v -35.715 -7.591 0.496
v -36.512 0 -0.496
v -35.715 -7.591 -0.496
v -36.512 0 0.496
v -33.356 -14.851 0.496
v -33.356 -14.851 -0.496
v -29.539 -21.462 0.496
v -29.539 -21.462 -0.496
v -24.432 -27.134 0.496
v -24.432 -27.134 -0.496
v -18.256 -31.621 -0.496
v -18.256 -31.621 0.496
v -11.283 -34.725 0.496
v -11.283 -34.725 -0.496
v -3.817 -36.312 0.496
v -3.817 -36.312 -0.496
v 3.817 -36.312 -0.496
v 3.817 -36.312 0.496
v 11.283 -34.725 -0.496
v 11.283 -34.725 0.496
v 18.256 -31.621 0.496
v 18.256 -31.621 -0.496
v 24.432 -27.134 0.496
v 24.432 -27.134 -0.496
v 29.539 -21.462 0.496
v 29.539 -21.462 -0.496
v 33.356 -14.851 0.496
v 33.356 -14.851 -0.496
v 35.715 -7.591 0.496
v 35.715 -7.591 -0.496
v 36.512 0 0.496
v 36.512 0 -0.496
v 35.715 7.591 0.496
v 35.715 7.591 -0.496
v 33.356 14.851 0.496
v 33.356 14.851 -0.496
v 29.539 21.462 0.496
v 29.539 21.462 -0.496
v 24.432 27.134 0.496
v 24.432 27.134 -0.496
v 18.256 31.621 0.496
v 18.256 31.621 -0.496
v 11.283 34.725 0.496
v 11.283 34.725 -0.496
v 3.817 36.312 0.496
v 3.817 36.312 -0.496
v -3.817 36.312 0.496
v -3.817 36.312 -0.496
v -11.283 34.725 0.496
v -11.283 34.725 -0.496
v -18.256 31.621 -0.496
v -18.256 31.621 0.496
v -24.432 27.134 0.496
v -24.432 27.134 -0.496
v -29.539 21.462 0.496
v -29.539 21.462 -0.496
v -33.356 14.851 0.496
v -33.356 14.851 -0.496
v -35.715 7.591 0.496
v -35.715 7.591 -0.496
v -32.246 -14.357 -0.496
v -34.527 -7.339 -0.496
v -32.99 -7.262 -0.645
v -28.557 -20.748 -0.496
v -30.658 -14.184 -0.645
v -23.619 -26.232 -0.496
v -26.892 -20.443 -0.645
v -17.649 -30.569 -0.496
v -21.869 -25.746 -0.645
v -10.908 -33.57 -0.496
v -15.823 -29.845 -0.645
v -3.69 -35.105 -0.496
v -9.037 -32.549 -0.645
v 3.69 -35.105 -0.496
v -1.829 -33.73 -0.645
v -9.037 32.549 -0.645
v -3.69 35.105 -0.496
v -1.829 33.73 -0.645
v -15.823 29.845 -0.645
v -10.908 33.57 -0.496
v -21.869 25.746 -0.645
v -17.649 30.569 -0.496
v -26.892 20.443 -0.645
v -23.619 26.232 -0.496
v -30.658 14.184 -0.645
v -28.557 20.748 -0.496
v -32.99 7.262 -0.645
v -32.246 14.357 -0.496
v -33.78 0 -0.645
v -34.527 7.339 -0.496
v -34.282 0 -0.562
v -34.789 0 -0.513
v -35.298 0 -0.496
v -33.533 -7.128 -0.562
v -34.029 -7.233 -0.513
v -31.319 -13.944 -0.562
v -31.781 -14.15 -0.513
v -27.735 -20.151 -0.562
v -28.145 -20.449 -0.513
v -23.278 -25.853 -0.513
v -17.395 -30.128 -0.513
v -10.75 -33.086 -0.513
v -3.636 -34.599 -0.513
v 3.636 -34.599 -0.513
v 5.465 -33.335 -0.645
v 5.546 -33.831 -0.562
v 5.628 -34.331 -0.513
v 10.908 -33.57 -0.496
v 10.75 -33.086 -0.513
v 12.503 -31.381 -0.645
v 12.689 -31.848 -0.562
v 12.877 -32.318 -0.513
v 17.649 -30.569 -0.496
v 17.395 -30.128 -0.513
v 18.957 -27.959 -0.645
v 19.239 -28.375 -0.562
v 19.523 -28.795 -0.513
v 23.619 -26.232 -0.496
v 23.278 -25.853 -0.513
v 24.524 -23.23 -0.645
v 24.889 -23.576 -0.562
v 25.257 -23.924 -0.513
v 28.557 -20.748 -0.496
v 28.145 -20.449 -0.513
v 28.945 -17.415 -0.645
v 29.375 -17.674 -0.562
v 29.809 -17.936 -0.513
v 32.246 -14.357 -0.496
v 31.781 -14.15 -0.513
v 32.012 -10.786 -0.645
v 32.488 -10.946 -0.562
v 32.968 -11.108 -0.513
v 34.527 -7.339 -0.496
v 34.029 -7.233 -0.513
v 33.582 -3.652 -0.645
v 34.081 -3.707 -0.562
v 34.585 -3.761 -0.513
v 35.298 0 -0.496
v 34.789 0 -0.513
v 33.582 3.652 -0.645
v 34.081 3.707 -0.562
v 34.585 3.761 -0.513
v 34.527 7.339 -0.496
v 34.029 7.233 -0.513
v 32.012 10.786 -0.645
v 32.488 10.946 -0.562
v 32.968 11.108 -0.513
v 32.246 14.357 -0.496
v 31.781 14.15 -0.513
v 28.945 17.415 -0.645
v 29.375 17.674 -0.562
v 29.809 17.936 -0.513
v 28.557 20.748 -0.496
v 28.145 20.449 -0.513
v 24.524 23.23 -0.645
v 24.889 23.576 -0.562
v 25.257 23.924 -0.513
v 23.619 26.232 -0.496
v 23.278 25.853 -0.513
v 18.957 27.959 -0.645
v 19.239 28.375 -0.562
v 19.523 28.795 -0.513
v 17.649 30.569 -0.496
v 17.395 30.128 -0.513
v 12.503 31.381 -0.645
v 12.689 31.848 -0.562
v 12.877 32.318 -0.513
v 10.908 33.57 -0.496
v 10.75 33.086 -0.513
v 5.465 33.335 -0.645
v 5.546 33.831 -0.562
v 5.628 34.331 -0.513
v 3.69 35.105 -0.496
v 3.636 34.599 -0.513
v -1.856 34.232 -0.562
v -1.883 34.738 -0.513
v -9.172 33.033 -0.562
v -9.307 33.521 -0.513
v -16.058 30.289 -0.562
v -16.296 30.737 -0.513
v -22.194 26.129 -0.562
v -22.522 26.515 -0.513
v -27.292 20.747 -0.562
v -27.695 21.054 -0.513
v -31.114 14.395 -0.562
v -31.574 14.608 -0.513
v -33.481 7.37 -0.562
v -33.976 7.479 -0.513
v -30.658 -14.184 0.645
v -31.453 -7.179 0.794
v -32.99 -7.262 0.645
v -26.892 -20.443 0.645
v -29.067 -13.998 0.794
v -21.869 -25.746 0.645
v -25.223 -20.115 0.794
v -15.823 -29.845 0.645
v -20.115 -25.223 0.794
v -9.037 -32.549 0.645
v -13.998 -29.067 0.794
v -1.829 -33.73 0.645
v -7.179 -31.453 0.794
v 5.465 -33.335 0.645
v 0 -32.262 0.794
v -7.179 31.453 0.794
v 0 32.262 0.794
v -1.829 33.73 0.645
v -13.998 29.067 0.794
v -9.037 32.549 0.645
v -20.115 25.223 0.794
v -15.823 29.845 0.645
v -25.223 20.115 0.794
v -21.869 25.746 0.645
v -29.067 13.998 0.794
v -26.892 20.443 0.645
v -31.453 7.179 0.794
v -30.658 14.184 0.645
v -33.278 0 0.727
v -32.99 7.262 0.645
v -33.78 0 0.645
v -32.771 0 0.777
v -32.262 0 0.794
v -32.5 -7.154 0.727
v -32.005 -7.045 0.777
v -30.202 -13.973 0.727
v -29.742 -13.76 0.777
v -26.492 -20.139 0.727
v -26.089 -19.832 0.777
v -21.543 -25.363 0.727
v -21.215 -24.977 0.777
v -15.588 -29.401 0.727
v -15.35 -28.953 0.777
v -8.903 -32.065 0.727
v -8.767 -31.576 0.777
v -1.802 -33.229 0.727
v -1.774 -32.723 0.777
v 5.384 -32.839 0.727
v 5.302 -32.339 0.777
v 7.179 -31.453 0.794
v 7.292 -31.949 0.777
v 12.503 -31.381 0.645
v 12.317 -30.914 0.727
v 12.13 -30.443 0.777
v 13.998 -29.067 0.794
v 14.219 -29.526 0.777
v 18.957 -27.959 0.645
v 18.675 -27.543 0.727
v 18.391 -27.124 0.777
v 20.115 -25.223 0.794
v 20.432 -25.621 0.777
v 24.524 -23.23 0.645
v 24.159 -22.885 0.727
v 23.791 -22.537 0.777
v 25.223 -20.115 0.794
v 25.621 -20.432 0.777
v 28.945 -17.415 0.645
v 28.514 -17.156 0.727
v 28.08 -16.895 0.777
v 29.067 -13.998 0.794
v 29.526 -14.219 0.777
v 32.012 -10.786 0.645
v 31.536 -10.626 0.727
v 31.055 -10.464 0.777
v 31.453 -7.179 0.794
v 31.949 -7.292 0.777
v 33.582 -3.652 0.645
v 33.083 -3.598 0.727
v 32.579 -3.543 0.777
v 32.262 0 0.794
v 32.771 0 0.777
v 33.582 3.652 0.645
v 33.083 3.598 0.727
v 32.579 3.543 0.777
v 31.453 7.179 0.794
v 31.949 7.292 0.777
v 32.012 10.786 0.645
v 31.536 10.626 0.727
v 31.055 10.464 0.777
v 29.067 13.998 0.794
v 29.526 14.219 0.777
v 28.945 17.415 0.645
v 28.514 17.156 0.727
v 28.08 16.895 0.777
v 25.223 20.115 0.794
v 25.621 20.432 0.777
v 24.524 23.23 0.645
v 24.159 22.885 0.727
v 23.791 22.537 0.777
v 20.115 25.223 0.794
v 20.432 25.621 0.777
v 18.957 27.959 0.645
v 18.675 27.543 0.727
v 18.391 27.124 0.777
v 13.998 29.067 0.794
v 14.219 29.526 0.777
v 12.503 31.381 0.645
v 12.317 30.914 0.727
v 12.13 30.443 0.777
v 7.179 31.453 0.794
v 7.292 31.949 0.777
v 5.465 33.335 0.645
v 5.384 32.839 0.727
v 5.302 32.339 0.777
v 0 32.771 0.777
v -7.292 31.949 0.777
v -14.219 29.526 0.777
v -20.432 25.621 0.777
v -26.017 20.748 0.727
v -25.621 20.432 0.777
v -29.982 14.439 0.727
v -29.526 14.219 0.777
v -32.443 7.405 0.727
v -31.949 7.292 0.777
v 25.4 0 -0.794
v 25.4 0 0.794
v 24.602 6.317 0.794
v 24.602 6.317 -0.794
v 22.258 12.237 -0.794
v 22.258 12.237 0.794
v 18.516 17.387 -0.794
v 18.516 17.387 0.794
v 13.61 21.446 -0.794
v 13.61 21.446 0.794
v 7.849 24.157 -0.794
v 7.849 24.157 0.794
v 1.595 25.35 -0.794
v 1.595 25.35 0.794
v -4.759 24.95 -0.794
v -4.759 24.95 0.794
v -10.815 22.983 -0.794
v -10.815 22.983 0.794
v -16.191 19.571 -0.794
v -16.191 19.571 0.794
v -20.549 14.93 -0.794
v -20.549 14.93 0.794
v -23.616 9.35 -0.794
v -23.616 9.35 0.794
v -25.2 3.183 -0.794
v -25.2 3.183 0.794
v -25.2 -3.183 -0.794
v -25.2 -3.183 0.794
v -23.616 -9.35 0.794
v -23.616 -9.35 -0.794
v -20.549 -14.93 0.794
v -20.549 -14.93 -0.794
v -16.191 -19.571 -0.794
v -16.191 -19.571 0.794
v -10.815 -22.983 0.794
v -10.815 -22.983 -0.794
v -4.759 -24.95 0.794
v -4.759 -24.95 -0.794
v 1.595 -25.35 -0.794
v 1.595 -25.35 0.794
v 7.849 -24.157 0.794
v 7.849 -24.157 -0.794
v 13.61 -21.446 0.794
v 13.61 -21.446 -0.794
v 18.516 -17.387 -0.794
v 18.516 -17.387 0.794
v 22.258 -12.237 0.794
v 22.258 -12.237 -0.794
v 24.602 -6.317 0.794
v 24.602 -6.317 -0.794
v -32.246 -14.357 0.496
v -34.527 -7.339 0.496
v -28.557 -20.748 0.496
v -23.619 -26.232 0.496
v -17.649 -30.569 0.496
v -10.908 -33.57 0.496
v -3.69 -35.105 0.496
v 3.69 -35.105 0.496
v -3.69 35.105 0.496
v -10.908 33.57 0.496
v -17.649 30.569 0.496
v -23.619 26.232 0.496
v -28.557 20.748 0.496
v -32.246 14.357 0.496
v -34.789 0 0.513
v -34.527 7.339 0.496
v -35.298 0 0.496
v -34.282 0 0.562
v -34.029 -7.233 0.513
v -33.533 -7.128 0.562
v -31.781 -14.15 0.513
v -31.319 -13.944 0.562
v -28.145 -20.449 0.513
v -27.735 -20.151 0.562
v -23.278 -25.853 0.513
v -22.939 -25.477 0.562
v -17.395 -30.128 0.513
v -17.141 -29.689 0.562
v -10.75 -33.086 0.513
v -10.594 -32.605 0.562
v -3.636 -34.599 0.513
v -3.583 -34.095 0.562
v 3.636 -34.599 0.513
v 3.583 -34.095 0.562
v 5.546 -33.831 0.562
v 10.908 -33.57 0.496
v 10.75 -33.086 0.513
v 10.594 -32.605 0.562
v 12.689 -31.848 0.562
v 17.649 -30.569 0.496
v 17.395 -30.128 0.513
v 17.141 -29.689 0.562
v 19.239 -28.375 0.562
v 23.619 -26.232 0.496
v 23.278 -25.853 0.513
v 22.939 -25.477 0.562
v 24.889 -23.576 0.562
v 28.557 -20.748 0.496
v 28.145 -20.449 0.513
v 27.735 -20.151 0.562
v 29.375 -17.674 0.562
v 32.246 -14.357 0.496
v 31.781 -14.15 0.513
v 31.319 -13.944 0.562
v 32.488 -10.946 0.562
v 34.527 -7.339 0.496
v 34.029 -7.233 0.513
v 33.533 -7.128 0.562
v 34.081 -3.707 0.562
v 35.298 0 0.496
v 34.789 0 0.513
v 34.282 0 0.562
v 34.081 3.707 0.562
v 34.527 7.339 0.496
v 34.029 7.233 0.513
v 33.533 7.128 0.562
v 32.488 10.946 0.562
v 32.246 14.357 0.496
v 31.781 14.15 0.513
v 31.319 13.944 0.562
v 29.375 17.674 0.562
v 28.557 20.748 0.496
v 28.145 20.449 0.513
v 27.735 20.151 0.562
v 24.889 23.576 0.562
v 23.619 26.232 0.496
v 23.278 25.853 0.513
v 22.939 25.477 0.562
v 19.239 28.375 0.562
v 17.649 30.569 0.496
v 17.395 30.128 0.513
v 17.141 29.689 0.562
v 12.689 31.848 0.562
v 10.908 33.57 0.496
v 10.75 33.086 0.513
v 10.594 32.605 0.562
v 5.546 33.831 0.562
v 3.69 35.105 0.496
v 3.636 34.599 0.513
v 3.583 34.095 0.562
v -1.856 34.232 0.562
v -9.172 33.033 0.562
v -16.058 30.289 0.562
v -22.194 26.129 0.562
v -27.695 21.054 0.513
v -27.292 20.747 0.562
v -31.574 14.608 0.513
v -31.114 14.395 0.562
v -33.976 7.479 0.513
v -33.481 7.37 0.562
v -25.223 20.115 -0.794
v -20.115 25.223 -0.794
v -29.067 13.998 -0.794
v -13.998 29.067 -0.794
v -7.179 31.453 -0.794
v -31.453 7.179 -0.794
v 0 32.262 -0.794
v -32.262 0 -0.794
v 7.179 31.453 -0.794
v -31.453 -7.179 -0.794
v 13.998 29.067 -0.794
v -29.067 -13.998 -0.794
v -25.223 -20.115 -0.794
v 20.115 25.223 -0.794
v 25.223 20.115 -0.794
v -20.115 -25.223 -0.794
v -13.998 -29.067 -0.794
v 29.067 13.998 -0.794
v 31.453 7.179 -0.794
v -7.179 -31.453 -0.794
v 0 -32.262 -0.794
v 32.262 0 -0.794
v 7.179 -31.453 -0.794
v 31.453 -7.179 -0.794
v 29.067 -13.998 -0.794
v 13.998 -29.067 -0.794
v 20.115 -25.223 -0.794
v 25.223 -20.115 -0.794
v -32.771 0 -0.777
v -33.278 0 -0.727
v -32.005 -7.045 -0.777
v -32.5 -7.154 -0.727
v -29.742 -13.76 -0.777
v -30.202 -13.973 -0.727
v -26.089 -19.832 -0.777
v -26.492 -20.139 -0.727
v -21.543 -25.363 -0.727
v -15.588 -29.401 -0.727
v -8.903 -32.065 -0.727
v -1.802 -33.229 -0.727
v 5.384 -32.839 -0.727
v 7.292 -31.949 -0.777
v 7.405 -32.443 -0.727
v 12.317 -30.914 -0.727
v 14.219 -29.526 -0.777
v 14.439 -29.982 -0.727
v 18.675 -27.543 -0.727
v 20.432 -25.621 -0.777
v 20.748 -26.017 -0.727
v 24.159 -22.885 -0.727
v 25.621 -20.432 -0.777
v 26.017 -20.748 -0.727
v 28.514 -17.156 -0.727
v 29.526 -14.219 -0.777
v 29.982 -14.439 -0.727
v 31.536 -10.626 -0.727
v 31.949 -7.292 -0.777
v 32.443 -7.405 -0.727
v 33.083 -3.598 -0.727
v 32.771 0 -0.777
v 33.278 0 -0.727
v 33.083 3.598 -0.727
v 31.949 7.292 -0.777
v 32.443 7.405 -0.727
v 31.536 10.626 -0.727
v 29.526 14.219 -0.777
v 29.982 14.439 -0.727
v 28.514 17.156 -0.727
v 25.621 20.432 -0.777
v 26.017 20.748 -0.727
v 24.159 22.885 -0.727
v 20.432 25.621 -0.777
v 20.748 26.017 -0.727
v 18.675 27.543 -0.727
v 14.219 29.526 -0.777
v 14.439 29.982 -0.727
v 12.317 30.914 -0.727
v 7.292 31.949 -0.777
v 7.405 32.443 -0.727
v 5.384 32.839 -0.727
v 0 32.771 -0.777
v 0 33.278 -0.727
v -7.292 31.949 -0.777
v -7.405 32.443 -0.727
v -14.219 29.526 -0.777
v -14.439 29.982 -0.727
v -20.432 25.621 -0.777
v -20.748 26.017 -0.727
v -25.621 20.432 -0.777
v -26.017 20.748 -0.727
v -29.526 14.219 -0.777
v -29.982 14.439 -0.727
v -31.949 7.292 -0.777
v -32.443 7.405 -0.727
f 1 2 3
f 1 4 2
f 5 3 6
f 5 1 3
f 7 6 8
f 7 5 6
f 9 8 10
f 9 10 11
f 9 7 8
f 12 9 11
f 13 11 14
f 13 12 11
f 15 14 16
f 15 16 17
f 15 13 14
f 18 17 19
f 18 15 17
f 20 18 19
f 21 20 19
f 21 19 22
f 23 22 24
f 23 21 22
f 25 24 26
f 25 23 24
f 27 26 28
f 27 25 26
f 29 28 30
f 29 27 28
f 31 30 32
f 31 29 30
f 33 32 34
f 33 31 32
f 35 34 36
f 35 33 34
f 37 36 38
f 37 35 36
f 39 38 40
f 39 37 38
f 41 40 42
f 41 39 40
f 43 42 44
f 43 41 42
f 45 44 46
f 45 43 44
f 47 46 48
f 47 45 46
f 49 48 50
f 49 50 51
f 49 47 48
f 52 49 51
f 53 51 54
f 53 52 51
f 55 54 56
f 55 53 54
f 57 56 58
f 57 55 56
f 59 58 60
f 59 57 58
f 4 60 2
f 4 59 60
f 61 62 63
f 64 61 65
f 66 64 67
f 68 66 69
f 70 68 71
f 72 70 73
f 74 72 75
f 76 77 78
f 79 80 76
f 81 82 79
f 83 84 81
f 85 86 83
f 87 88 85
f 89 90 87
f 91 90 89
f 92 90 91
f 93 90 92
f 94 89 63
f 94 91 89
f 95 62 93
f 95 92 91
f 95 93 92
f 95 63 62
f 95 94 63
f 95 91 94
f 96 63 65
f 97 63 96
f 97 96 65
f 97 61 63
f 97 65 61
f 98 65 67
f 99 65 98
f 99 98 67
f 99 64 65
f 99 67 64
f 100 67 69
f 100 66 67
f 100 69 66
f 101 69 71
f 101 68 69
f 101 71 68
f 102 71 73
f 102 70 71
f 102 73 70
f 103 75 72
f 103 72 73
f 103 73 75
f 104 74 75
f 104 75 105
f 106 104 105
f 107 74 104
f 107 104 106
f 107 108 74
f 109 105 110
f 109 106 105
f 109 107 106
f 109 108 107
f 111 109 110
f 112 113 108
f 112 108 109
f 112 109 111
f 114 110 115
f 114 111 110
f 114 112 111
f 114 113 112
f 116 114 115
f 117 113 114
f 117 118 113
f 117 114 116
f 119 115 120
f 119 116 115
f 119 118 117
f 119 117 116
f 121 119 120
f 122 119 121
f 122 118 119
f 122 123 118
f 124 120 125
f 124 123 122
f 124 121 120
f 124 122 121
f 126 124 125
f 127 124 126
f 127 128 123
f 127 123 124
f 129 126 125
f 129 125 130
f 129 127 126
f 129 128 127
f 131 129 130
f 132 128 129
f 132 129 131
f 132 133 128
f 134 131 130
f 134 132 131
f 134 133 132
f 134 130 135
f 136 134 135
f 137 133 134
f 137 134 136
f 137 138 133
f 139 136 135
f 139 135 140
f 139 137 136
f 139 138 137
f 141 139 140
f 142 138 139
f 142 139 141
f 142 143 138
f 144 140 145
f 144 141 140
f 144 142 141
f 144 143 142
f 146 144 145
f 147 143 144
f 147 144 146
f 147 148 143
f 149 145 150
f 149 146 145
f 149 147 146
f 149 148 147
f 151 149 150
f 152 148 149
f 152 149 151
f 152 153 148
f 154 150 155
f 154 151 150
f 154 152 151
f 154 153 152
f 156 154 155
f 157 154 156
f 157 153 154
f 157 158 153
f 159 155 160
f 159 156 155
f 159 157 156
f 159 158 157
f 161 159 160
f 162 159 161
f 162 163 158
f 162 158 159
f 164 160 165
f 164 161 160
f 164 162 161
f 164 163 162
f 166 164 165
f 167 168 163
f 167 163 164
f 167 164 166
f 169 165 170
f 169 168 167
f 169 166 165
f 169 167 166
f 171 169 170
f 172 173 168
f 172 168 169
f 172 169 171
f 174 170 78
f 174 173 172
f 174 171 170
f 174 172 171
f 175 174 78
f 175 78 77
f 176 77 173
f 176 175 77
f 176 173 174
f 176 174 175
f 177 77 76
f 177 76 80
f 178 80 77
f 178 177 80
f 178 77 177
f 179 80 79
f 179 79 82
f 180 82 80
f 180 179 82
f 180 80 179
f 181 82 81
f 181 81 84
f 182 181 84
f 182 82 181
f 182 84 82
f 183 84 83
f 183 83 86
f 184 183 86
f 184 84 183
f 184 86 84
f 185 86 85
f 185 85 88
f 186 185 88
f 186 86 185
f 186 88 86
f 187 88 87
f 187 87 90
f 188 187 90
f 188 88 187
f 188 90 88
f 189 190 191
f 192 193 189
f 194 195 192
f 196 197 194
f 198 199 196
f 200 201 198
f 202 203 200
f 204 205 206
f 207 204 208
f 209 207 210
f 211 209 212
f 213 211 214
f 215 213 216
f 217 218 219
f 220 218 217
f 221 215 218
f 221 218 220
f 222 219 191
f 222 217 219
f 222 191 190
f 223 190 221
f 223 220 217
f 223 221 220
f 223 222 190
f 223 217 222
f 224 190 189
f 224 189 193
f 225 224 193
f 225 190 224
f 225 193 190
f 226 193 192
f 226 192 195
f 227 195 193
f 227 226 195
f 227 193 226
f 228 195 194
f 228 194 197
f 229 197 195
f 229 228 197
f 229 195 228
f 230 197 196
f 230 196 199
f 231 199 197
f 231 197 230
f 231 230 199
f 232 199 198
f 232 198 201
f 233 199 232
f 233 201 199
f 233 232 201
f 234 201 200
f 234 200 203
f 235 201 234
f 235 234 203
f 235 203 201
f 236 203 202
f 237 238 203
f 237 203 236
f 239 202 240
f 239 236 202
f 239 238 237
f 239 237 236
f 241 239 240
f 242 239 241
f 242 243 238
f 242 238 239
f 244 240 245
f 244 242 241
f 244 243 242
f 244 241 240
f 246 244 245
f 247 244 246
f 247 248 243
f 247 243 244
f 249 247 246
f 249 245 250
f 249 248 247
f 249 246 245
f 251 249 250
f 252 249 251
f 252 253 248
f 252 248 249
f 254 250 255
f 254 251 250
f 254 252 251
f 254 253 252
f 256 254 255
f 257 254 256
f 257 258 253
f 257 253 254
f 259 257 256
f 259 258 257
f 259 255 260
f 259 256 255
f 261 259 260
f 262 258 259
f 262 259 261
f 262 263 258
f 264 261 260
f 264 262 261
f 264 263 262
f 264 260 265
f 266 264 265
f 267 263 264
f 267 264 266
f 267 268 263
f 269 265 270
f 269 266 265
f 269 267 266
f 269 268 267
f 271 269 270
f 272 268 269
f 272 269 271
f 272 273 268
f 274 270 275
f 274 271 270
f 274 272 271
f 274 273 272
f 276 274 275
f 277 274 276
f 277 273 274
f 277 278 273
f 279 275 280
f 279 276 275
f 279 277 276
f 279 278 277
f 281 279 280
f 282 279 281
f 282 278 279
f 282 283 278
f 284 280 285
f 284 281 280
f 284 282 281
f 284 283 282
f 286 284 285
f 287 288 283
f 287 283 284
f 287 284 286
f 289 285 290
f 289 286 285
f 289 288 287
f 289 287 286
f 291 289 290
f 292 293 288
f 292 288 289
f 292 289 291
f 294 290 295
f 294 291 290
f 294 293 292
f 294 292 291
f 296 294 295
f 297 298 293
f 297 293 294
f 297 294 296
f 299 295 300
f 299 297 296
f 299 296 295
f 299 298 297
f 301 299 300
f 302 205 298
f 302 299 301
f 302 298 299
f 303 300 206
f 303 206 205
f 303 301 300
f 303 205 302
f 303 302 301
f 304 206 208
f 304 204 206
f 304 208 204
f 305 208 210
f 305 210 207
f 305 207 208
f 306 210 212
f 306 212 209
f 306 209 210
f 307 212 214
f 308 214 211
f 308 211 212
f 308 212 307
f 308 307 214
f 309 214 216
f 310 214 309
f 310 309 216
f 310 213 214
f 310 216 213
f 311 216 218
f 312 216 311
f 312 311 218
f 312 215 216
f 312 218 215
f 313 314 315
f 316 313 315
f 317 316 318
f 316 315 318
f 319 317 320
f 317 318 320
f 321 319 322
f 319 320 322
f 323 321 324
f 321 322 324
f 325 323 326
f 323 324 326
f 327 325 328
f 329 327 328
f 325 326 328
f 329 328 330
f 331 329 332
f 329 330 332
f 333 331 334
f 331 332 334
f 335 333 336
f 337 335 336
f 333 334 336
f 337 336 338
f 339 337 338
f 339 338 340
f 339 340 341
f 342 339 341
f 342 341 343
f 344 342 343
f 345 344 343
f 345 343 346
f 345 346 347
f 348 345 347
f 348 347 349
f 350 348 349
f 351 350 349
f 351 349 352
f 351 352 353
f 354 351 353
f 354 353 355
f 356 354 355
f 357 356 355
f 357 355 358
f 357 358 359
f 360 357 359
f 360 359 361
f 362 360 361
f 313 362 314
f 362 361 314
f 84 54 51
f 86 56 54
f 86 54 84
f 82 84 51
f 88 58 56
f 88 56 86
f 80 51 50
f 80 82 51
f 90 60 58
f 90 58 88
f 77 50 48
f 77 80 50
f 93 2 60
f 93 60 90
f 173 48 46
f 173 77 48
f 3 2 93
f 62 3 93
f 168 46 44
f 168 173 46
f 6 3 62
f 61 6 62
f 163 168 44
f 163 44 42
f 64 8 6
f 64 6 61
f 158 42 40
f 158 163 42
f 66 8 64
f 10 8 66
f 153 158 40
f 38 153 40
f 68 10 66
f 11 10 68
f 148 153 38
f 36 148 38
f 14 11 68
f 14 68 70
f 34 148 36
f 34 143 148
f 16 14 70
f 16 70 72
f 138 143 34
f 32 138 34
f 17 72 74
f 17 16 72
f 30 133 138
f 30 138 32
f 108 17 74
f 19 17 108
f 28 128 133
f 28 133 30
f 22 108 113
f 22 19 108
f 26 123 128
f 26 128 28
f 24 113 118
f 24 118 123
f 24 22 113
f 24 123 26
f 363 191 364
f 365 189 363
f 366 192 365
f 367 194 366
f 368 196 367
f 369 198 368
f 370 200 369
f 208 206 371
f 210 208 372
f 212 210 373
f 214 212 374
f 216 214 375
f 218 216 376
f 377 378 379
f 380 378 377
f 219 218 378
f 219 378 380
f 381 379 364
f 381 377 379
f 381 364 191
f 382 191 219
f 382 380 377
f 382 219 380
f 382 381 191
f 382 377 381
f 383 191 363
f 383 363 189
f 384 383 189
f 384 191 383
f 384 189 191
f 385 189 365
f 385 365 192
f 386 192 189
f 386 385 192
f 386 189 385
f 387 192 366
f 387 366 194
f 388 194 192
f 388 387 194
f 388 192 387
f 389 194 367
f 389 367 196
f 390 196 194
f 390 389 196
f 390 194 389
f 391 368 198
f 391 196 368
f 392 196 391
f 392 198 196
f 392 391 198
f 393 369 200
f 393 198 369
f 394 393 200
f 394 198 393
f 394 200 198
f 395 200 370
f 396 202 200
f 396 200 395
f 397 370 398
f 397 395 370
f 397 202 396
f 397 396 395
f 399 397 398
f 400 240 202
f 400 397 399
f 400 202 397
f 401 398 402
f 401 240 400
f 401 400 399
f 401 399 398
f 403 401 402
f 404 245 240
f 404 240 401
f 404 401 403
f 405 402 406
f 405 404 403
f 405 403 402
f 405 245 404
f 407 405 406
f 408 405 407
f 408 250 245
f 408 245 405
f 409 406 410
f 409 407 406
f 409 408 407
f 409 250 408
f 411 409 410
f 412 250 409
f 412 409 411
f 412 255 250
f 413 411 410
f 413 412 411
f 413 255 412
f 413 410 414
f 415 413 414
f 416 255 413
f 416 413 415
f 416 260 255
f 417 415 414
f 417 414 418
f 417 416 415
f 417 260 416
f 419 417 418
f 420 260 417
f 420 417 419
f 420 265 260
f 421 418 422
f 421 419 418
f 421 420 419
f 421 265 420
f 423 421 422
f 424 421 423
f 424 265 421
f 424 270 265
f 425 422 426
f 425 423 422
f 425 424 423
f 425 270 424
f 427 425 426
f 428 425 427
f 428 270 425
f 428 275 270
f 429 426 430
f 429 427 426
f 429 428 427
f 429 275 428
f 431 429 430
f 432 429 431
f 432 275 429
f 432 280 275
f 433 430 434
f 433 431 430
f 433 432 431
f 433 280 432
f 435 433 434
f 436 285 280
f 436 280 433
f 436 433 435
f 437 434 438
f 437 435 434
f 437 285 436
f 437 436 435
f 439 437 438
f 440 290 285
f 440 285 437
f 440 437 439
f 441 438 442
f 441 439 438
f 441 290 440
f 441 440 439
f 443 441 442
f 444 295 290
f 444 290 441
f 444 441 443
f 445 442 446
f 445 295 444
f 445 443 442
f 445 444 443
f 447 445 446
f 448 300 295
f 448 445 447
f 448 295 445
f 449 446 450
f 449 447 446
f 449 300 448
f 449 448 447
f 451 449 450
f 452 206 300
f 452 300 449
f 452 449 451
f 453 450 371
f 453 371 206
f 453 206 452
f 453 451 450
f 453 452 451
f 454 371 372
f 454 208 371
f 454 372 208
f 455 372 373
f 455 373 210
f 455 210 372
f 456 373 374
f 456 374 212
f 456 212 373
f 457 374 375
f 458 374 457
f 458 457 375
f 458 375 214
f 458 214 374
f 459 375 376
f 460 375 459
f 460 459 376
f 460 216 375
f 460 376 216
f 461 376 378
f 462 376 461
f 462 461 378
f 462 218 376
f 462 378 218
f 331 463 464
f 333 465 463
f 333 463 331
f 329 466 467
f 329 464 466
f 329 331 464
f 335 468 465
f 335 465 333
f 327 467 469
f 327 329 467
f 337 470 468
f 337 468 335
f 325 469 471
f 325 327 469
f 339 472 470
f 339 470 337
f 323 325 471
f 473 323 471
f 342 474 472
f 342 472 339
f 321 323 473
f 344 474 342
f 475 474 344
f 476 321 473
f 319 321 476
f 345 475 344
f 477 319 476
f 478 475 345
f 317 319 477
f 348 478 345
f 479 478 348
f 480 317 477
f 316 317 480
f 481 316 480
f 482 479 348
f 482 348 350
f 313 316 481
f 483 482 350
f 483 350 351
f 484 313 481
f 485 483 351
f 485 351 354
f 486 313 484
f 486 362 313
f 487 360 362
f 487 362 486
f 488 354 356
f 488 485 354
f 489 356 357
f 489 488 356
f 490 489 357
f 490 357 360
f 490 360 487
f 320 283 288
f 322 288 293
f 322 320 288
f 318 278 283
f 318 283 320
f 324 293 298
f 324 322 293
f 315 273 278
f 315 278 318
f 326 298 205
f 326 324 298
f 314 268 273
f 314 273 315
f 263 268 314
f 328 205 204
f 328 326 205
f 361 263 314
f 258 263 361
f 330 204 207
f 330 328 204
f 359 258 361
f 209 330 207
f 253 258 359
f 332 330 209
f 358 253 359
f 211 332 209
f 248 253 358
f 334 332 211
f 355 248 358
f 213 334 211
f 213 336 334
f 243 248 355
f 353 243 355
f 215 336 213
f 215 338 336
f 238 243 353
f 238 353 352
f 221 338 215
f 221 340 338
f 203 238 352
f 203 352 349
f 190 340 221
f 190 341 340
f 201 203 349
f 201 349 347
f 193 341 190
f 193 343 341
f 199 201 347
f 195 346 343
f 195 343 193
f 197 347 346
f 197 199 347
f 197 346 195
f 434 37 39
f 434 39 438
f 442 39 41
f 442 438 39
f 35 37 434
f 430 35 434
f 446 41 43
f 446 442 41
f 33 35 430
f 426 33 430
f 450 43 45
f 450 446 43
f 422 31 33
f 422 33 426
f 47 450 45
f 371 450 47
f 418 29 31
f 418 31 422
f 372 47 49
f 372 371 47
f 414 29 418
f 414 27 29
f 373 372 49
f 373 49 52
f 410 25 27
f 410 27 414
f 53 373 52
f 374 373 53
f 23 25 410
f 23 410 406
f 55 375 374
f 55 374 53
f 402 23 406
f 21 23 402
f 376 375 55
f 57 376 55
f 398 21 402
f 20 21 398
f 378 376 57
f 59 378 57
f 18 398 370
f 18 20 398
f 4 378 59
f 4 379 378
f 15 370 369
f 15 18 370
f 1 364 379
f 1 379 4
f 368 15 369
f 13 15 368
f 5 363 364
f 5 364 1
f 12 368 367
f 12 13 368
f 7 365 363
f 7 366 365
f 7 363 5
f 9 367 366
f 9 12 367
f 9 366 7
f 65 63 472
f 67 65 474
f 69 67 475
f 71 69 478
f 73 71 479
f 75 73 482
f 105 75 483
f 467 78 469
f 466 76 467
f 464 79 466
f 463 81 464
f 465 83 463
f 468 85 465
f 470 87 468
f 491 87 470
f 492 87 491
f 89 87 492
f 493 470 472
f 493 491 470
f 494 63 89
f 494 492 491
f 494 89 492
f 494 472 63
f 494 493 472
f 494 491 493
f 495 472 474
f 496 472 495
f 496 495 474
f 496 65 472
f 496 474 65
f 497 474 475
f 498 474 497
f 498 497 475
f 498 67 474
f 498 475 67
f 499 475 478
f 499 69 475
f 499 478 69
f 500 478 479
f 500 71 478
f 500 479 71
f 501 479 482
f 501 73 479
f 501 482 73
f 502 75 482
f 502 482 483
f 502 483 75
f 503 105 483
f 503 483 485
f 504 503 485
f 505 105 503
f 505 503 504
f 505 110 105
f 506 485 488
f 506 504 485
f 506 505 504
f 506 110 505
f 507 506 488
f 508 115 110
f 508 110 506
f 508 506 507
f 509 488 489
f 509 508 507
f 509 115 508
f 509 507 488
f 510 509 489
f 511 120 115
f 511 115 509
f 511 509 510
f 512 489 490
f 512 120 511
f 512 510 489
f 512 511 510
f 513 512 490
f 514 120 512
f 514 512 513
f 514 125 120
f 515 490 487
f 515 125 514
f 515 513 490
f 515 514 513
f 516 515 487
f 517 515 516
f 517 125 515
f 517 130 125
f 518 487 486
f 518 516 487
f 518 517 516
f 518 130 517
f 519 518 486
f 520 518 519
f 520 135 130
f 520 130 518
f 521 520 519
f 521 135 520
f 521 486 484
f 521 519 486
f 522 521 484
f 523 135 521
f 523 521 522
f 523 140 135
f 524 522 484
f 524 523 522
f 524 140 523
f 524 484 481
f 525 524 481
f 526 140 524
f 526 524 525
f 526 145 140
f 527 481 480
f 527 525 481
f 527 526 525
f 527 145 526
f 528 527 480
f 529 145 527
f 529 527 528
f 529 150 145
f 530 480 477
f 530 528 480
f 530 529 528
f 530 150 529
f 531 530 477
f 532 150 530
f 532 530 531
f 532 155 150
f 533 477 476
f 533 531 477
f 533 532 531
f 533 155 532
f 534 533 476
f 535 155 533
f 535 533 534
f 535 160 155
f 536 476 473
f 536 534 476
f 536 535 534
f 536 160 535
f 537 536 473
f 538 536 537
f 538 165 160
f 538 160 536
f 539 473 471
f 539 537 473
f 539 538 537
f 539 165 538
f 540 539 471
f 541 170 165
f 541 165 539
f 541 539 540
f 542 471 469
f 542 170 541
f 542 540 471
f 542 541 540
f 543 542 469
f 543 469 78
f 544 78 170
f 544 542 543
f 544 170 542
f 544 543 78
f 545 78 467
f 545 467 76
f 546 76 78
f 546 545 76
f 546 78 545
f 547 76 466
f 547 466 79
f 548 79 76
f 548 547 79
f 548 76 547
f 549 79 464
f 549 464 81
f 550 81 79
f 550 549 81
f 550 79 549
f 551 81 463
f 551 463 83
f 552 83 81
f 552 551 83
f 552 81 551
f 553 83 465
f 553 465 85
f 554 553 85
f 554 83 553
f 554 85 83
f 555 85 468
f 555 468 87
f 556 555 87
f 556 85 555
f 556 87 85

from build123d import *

# Parameters (mm, degrees)
SKETCH4_R          = 25.4
CUT_EXTRUDE1_DEPTH = 2.54


with BuildPart() as part:
    # Sketch3 → Revolve1 (revolve)
    with BuildSketch(Plane(origin=(0, 0, 0), x_dir=(0, 0, -1), z_dir=(1, 0, 0)), mode=Mode.PRIVATE) as revolve1_sk:
        with BuildLine():
            Line((0.49609375, 36.5125), (-0.49609375, 36.5125))
            Line((-0.49609375, 36.5125), (-0.49609375, 35.2980625))
            ThreePointArc((-0.49609375, 35.2980625), (-0.53338976, 34.535400038), (-0.644921875, 33.780015625))
            ThreePointArc((-0.644921875, 33.780015625), (-0.75645399, 33.024631212), (-0.79375, 32.26196875))
            Line((-0.79375, 32.26196875), (-0.79375, 18.70075))
            ThreePointArc((-0.79375, 18.70075), (-0.756233853, 18.289154795), (-0.644921875, 17.891125))
            ThreePointArc((-0.644921875, 17.891125), (-0.533609897, 17.493095205), (-0.49609375, 17.0815))
            Line((-0.49609375, 17.0815), (-0.49609375, 16.271875))
            Line((-0.49609375, 16.271875), (0.49609375, 16.271875))
            Line((0.49609375, 16.271875), (0.49609375, 17.0815))
            ThreePointArc((0.49609375, 17.0815), (0.533609897, 17.493095205), (0.644921875, 17.891125))
            ThreePointArc((0.644921875, 17.891125), (0.756233853, 18.289154795), (0.79375, 18.70075))
            Line((0.79375, 18.70075), (0.79375, 32.26196875))
            ThreePointArc((0.79375, 32.26196875), (0.75645399, 33.024631212), (0.644921875, 33.780015625))
            ThreePointArc((0.644921875, 33.780015625), (0.53338976, 34.535400038), (0.49609375, 35.2980625))
            Line((0.49609375, 35.2980625), (0.49609375, 36.5125))
        make_face()
    revolve(revolve1_sk.sketch.rotate(Axis((0, 0, -0.79375), (0, 0, 1)), 90), axis=Axis((0, 0, -0.79375), (0, 0, 1)))

    # Sketch4 → Cut-Extrude1 (cut)
    with BuildSketch(Plane.XY.offset(0.79375)):
        Circle(SKETCH4_R)
    extrude(amount=-CUT_EXTRUDE1_DEPTH, mode=Mode.SUBTRACT)


solid = part.part
